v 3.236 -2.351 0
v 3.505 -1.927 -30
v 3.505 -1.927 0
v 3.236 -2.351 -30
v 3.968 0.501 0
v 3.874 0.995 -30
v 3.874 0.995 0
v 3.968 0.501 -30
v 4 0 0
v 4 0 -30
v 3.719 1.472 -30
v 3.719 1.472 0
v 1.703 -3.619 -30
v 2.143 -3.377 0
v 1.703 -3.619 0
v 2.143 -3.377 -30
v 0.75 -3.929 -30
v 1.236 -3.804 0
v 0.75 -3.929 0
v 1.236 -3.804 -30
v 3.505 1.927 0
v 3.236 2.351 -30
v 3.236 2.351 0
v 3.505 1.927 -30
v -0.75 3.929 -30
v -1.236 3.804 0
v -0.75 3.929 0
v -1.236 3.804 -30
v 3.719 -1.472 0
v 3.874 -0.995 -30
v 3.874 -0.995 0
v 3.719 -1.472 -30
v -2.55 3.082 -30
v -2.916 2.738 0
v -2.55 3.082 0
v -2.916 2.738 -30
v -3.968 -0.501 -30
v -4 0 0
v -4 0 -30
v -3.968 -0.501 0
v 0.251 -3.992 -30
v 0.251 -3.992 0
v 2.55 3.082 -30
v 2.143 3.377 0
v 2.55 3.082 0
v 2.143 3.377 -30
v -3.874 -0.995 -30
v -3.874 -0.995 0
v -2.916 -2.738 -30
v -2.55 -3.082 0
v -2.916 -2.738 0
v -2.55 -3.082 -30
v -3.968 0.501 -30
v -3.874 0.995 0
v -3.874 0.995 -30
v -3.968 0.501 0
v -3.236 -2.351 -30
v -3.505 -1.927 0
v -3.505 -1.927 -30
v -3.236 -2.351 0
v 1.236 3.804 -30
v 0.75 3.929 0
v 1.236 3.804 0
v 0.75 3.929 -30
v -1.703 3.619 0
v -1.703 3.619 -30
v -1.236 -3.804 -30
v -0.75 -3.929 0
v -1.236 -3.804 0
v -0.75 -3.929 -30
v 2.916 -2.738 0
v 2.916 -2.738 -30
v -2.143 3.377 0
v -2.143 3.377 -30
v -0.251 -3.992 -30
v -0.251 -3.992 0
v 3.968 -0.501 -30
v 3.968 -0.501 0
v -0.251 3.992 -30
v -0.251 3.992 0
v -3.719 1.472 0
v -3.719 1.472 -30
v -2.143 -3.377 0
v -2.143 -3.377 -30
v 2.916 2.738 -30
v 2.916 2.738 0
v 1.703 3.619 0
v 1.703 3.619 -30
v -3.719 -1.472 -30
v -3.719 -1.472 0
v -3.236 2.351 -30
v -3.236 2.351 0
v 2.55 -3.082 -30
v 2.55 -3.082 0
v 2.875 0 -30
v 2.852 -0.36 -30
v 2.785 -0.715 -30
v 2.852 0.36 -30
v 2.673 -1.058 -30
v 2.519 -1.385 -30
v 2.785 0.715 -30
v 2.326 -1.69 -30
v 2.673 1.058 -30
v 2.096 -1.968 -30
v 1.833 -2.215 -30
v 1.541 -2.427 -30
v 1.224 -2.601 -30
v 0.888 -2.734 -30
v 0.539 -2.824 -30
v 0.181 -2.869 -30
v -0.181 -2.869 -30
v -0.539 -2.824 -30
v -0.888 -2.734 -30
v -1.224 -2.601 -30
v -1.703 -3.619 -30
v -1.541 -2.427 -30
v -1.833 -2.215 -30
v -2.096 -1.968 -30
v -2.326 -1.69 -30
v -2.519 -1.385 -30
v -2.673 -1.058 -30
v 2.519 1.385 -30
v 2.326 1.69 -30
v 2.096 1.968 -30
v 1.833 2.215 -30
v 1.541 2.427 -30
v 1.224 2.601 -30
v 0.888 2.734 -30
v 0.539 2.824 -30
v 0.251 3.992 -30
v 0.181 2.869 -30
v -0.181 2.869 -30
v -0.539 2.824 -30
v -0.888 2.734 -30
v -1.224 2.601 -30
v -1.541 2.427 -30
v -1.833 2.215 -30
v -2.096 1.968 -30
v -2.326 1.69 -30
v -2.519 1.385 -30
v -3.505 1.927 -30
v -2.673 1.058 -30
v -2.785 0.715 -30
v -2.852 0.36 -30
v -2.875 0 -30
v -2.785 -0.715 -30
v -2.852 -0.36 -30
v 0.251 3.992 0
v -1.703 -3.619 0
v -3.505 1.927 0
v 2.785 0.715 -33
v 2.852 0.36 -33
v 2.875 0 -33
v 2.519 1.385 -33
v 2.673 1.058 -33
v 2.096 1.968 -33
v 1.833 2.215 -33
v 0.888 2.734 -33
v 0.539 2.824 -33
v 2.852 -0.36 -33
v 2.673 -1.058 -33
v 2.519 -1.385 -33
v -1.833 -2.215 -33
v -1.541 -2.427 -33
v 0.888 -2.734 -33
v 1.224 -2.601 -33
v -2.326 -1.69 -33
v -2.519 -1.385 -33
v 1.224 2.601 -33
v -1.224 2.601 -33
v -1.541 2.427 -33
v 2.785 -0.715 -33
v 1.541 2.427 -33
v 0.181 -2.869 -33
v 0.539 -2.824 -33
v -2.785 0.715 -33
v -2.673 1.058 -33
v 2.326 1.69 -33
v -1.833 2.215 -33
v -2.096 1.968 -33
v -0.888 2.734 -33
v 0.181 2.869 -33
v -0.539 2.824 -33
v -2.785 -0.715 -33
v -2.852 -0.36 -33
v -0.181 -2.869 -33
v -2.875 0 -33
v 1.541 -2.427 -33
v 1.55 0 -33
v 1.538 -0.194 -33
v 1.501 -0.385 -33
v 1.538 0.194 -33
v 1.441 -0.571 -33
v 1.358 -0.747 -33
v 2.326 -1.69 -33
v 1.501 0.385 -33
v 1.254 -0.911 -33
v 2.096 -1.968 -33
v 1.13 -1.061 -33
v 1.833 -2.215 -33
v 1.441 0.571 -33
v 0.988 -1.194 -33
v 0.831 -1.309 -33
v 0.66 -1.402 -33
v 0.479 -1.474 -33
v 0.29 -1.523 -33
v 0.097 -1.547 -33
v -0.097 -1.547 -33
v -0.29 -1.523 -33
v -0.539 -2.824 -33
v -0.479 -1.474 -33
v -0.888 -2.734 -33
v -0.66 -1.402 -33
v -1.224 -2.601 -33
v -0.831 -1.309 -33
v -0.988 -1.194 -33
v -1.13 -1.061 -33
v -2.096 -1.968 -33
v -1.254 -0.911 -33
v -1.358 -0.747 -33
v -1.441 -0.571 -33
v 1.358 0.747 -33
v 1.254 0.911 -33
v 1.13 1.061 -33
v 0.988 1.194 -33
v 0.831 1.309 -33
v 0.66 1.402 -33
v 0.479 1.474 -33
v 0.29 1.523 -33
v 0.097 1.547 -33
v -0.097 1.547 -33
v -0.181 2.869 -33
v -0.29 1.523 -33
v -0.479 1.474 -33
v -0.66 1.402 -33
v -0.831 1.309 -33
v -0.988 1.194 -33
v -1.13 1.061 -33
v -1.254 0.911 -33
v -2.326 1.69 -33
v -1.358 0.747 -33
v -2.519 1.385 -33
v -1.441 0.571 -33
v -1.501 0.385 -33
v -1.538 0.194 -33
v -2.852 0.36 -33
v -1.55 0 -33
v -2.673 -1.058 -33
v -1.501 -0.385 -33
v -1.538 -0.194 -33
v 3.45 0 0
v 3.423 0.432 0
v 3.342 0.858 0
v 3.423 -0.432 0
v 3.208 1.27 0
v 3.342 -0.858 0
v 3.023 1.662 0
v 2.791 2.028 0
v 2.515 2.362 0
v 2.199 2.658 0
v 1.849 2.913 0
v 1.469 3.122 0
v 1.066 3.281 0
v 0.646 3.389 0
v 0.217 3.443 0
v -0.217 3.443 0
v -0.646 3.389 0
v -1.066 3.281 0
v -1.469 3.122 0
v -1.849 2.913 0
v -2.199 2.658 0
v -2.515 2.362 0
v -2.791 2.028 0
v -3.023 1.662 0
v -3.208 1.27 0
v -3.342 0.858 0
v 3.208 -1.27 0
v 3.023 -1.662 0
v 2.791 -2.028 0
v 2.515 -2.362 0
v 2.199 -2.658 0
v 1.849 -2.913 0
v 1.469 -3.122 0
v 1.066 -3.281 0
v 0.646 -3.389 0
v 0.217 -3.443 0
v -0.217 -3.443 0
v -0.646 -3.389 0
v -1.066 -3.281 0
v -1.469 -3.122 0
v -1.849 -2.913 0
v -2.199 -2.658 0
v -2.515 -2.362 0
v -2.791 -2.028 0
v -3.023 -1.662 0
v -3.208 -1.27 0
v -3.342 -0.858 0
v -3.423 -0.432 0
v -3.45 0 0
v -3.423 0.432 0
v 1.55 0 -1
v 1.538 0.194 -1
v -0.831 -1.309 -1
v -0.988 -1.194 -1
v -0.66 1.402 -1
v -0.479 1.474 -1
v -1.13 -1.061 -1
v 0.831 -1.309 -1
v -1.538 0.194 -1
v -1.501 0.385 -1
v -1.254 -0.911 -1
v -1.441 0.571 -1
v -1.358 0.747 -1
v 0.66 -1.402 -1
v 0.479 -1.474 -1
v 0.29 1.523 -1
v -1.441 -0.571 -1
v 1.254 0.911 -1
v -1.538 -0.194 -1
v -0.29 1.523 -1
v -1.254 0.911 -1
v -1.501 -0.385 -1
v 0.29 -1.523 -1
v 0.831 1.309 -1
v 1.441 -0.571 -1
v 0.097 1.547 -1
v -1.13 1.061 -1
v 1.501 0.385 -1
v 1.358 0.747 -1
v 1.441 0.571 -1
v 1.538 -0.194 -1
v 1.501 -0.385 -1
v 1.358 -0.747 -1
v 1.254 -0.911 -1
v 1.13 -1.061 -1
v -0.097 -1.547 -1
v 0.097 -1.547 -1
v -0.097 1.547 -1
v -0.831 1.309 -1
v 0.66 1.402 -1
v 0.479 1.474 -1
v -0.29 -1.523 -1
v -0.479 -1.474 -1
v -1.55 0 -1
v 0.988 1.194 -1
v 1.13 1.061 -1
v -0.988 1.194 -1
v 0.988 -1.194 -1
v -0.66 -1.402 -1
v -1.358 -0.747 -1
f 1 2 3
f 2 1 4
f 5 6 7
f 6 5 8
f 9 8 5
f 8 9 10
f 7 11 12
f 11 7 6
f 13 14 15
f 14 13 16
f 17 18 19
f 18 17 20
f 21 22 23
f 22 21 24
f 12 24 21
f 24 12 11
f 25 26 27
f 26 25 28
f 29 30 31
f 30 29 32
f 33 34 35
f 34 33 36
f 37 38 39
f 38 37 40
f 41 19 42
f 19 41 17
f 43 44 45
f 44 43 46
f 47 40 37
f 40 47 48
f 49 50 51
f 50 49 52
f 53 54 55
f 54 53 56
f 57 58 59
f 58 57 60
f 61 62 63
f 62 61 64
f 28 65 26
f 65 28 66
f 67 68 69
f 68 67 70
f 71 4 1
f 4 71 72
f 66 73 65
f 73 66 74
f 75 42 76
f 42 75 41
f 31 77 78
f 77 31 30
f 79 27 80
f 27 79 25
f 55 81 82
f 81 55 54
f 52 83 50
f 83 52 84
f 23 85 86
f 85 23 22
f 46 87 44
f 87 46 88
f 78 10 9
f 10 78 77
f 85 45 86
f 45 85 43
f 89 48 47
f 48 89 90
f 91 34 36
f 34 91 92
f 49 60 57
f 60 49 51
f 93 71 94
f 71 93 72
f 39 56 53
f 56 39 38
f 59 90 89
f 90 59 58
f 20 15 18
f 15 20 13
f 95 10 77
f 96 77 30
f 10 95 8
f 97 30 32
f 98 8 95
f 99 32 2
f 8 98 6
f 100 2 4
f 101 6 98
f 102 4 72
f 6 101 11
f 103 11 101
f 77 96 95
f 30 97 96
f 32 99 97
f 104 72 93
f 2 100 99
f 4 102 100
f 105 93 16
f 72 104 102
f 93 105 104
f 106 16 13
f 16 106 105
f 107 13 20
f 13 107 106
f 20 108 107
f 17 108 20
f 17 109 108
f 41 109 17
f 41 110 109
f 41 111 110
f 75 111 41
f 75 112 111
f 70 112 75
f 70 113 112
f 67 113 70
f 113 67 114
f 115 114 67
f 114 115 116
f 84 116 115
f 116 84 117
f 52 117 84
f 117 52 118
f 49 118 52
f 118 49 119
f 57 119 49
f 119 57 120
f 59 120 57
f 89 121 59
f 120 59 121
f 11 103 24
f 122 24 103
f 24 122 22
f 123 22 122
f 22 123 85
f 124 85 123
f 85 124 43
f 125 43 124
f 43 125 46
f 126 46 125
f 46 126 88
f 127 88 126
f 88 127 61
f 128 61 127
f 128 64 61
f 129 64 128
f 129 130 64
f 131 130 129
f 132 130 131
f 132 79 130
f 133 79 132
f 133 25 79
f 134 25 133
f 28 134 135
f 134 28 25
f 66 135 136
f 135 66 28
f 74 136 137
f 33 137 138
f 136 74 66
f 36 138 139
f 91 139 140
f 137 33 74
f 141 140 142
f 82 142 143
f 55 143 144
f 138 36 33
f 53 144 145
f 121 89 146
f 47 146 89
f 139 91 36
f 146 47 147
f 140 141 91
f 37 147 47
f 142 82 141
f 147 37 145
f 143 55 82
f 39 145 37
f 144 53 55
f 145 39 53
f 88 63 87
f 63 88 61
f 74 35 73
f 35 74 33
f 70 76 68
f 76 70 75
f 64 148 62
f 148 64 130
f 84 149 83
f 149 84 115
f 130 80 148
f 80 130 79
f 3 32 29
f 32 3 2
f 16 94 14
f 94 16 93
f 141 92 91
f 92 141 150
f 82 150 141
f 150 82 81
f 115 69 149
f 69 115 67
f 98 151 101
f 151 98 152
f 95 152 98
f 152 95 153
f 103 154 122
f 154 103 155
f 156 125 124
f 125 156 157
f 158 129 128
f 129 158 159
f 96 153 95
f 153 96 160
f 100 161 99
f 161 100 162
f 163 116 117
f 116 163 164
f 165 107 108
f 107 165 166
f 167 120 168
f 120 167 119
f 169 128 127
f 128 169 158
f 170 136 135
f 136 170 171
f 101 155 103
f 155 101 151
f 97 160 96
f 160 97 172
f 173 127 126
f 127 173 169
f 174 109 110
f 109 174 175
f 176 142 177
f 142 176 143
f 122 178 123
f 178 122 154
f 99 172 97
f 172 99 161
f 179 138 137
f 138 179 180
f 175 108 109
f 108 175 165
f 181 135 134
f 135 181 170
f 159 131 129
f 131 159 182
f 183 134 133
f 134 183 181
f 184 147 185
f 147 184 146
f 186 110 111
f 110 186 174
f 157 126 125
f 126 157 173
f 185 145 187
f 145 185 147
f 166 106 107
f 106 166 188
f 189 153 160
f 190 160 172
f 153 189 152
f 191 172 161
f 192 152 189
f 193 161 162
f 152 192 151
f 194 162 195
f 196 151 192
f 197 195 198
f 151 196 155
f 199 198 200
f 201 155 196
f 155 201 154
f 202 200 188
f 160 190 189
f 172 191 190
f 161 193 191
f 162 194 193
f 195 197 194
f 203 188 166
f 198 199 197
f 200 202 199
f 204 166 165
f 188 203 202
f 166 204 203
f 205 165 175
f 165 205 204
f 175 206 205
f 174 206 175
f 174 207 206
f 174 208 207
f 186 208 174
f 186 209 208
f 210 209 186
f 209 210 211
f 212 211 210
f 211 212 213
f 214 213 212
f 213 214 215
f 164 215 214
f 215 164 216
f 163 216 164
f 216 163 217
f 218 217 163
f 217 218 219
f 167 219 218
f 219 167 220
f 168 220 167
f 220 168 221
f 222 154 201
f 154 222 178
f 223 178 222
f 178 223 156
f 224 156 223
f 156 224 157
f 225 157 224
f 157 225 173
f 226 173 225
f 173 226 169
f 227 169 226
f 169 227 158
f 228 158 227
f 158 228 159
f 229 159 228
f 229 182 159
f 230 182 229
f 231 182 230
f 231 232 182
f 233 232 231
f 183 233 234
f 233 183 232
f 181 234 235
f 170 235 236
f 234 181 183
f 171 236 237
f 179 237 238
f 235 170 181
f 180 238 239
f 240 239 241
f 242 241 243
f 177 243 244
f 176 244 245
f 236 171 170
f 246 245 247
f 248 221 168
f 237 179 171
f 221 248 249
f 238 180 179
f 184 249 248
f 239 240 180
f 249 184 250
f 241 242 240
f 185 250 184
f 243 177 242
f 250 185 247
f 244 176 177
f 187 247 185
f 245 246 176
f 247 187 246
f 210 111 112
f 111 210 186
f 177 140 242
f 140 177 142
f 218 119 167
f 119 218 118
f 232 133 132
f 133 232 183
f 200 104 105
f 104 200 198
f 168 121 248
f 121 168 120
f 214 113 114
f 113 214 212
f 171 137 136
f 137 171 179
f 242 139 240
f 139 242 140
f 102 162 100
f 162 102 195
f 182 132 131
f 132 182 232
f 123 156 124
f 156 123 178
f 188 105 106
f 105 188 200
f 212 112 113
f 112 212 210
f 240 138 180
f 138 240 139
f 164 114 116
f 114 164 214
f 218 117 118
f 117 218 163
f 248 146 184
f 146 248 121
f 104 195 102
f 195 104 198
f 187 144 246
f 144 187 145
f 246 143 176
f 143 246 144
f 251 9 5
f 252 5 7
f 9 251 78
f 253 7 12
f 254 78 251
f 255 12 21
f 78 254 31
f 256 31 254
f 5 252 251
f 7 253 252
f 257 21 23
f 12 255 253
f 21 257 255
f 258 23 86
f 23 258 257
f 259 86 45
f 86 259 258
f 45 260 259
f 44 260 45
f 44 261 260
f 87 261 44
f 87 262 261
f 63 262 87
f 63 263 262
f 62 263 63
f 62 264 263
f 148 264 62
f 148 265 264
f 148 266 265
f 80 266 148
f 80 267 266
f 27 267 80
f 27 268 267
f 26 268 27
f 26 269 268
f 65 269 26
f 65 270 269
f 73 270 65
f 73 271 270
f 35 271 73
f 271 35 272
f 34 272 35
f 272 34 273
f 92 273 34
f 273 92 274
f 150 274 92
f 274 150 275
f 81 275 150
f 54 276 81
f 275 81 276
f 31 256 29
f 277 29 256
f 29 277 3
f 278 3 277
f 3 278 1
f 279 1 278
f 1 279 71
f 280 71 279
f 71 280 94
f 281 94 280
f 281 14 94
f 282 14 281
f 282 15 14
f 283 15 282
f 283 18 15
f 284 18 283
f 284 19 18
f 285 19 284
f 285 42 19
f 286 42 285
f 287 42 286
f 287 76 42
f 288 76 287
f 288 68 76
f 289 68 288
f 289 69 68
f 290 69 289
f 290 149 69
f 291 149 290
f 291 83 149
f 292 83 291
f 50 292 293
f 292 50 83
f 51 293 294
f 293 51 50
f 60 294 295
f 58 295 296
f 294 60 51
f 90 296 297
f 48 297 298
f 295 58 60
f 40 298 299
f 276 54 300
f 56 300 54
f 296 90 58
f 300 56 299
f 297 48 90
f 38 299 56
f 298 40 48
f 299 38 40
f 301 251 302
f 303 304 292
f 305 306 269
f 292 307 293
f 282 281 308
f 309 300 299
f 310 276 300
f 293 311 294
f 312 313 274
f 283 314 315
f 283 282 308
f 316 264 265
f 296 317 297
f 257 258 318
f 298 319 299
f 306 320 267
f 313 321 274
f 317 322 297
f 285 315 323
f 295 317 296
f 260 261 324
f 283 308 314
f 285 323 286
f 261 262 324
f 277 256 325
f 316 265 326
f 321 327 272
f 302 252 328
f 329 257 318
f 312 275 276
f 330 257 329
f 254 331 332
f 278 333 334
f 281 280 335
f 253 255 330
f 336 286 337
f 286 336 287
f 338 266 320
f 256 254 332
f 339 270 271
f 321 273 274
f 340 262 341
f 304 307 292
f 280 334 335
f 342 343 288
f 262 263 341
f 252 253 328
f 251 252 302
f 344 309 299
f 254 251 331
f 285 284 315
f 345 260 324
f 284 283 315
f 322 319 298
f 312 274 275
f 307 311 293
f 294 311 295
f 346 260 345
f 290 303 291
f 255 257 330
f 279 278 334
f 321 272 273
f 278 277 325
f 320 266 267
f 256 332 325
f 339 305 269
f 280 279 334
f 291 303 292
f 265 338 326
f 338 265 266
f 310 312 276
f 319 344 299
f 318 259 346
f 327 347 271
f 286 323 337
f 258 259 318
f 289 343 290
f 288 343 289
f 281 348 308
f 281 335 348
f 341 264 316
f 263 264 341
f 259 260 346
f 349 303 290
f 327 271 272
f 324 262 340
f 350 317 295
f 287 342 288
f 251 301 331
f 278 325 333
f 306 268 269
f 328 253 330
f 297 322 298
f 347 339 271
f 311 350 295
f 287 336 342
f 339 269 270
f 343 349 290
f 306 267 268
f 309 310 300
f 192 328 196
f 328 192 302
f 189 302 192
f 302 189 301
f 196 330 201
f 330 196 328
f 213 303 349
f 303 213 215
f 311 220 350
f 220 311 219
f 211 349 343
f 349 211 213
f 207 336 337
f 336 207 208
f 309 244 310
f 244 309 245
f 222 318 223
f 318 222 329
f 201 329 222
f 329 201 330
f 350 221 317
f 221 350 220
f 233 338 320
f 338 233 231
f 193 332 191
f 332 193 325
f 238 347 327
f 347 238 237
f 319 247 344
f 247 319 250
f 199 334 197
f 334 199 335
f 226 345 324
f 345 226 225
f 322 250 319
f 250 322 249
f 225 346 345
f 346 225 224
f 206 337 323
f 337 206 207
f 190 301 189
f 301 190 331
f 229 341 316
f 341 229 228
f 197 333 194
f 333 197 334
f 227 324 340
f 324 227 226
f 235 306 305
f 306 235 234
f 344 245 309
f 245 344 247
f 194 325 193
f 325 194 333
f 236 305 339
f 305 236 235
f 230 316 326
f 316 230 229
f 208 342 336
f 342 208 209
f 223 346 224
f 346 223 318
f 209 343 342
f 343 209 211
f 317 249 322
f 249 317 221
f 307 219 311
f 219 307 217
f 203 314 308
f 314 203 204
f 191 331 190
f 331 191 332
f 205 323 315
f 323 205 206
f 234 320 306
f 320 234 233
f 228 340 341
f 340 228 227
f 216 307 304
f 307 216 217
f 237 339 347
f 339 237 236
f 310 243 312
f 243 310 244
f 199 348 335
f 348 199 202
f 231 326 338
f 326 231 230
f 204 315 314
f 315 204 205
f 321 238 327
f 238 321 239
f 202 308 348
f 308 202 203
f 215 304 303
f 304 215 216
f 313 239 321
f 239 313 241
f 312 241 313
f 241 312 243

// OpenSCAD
$fn = 50;

difference() {
	union() {
		translate(v = [0, 0, -30.0]) {
			cylinder(h = 33, r = 4.0);
		}
		#translate(v = [0, 0, -33.0]) {
			cylinder(h = 33, r = 2.875);
		}
	}
	union() {
		translate(v = [0, 0, 0]) {
			rotate(a = [0, 0, 0]) {
				difference() {
					union() {
						translate(v = [0, 0, -33.0]) {
							cylinder(h = 33, r = 1.25);
						}
						translate(v = [0, 0, -1.0]) {
							cylinder(h = 1.0, r1 = 1.55, r2 = 3.45);
						}
						translate(v = [0, 0, -33.0]) {
							cylinder(h = 33, r = 1.55);
						}
						translate(v = [0, 0, -33.0]) {
							cylinder(h = 33, r = 1.25);
						}
					}
					union();
				}
			}
		}
		#cylinder(h = 3, r = 5.0);
	}
}
